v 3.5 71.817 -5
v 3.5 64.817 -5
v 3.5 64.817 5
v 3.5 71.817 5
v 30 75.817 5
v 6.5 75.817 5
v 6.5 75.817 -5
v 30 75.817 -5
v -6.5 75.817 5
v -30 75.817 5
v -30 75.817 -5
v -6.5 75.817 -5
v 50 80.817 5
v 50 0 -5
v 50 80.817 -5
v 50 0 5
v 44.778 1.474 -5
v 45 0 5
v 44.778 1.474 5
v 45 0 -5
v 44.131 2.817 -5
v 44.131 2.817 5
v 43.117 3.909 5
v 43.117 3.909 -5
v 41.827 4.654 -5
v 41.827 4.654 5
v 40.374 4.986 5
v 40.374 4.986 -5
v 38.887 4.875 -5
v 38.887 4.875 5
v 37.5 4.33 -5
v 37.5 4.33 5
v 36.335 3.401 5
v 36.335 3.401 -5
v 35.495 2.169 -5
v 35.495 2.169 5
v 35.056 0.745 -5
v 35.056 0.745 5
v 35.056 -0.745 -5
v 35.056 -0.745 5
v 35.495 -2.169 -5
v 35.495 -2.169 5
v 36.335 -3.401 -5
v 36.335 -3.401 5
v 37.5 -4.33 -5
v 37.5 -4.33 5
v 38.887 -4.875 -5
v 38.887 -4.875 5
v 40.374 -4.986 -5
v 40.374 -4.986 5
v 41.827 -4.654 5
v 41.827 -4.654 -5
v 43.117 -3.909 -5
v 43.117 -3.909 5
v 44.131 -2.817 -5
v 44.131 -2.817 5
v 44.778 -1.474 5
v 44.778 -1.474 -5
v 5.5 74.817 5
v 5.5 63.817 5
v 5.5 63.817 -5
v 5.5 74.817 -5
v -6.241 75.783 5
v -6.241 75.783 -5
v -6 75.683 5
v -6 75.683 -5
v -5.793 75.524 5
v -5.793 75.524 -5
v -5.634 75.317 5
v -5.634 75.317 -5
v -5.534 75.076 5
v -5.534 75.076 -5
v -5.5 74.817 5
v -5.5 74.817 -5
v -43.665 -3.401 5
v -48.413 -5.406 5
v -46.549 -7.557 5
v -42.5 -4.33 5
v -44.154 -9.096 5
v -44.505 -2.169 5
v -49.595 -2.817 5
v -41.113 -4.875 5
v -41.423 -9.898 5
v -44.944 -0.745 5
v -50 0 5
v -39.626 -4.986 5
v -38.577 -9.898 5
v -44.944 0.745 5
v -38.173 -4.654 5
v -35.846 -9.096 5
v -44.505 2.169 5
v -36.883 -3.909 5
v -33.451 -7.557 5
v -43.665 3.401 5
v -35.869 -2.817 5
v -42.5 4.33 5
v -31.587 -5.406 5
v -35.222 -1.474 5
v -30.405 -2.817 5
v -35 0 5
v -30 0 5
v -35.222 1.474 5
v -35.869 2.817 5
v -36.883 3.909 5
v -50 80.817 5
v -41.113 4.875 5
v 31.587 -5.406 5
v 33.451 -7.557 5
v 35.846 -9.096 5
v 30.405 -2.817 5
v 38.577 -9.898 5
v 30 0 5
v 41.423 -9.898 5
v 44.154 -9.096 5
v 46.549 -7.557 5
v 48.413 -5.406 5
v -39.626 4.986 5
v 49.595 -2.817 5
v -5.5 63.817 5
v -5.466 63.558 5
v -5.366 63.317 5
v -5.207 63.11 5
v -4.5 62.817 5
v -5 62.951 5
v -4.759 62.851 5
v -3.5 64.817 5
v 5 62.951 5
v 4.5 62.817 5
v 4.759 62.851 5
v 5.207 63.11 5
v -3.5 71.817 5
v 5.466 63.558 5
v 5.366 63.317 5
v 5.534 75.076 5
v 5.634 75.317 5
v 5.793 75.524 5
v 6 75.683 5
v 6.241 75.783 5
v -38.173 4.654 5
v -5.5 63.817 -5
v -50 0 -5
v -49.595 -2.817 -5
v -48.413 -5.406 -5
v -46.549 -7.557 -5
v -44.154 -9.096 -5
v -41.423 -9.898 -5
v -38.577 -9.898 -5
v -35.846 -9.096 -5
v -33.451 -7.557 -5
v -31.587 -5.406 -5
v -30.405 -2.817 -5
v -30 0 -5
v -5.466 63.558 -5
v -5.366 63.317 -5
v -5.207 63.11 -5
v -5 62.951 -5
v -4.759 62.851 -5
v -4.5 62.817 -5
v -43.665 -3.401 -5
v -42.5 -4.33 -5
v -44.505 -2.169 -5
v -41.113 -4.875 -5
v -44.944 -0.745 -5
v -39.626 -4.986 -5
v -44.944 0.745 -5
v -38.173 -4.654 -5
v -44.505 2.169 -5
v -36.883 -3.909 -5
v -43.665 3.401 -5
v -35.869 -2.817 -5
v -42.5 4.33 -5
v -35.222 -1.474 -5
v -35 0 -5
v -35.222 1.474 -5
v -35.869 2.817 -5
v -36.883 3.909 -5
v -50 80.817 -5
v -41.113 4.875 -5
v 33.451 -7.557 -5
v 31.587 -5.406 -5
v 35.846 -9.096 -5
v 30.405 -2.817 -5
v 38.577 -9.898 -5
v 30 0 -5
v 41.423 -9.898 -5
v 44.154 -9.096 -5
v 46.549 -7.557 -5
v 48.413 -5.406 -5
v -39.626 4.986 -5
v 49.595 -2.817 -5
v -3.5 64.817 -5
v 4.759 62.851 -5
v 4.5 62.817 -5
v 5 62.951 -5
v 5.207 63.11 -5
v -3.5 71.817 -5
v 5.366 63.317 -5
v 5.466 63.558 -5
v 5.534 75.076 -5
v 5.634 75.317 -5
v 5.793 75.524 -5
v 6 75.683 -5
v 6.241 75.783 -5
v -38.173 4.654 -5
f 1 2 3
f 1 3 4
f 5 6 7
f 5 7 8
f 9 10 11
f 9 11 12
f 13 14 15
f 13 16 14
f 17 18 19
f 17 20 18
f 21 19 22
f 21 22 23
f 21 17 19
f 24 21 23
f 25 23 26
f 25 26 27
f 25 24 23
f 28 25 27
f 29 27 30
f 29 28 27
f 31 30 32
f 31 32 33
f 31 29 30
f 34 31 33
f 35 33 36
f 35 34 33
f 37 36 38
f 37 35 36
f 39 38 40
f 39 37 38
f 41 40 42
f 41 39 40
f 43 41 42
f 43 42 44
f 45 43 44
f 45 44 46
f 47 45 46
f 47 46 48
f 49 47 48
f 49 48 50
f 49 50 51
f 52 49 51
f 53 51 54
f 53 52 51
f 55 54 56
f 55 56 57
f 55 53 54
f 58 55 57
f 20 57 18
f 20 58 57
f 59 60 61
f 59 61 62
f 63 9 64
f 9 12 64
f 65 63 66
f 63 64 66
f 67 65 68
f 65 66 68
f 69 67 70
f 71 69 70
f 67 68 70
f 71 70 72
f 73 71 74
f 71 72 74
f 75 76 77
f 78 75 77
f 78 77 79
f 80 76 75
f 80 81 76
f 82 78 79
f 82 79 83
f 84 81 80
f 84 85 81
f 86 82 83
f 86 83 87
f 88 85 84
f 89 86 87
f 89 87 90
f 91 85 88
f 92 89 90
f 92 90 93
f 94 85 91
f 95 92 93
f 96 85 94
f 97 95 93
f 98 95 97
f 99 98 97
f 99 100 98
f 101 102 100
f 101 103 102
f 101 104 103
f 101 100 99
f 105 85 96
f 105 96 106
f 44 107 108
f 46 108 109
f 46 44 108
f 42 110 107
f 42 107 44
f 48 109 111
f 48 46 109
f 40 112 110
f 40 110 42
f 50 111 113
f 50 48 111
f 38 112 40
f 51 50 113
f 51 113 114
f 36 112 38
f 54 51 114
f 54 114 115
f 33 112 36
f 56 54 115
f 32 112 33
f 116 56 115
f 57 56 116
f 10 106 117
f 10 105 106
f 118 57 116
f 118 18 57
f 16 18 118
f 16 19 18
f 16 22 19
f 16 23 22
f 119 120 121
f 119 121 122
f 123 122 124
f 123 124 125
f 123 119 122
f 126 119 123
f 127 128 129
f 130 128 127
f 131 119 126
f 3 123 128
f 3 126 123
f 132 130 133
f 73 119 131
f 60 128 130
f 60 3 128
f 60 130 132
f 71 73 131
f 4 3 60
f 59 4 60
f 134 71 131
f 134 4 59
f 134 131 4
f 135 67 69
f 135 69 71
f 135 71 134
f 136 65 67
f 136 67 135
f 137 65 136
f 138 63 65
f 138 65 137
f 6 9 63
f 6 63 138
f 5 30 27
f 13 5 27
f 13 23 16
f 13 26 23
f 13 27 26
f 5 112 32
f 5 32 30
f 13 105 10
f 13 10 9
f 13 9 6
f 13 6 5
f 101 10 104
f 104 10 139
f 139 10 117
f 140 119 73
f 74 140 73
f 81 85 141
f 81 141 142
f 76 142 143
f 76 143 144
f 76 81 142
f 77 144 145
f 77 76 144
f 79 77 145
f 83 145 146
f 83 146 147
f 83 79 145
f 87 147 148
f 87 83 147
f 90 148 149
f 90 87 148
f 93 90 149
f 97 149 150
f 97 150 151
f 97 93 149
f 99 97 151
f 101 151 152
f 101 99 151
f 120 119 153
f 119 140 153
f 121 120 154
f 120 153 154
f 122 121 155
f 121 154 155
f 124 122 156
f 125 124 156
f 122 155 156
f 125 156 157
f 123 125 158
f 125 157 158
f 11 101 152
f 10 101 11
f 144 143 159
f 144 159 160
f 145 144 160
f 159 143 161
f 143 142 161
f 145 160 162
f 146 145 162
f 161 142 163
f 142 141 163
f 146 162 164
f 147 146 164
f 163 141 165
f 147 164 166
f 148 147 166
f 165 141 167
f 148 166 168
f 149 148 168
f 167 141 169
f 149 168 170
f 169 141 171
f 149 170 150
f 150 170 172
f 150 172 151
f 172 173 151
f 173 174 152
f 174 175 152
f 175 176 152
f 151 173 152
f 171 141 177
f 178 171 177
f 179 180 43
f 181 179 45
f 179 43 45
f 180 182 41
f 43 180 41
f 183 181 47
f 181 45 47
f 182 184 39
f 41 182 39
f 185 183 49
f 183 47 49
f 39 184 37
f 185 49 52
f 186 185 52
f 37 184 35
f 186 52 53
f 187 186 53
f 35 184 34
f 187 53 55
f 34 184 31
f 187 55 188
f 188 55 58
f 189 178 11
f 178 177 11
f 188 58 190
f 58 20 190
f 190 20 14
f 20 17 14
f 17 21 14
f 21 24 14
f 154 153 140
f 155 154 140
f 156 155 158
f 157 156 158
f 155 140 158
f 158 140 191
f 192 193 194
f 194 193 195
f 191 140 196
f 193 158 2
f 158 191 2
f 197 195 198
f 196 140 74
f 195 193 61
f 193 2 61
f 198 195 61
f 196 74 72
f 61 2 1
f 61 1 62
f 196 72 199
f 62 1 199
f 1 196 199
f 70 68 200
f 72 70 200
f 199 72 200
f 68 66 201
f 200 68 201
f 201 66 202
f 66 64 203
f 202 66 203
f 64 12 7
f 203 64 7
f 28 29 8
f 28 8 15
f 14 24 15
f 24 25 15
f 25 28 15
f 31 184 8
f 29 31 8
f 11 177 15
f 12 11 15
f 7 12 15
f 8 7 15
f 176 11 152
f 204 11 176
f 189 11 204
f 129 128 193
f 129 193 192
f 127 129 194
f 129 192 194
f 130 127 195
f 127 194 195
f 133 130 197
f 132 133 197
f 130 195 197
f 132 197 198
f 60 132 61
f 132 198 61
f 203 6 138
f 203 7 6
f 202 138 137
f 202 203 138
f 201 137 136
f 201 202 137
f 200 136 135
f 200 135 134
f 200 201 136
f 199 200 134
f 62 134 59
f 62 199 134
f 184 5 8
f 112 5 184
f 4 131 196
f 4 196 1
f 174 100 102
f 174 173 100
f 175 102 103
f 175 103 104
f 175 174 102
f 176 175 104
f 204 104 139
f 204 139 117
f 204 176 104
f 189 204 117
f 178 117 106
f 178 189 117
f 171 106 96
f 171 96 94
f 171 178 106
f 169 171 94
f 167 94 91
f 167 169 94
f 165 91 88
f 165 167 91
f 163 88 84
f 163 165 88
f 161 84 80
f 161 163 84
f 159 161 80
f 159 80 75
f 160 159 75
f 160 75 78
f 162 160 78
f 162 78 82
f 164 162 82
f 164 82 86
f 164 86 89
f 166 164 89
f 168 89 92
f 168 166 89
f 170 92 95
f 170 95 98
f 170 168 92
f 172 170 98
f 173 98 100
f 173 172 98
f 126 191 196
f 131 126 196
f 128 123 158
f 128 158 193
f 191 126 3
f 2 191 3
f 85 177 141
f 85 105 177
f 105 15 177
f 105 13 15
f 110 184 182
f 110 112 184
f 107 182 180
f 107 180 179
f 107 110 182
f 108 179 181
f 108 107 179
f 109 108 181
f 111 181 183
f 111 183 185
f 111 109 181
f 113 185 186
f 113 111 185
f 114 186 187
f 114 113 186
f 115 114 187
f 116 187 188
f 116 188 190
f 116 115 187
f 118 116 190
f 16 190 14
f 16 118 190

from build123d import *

# Parameters (mm, degrees)
SKETCH1_W           = 60
SKETCH1_H           = 5
SKETCH1_R           = 10
SKETCH1_R_2         = 5
BOSS_EXTRUDE1_DEPTH = 5
SKETCH2_W           = 11
SKETCH2_H           = 13
SKETCH2_W_2         = 7
SKETCH2_H_2         = 7
BOSS_EXTRUDE2_DEPTH = 10
FILLET1_R           = 1


with BuildPart() as part:
    # Sketch1 → Boss-Extrude1 (new body, symmetric)
    with BuildSketch(Plane.XY):
        with BuildLine():
            Line((-50, 80.817230765), (-50, 0))
            ThreePointArc((-50, 0), (-40, 10), (-30, 0))
            Line((-30, 0), (-30, 75.817230765))
            Line((-30, 75.817230765), (-30, 80.817230765))
            Line((-30, 80.817230765), (-50, 80.817230765))
        make_face()
        with Locations((0, 78.317230765)):
            Rectangle(SKETCH1_W, SKETCH1_H)
        with BuildLine():
            Line((50, 80.817230765), (30, 80.817230765))
            Line((30, 80.817230765), (30, 75.817230765))
            Line((30, 75.817230765), (30, 0))
            ThreePointArc((30, 0), (40, 10), (50, 0))
            Line((50, 0), (50, 80.817230765))
        make_face()
        with Locations((-40, 0)):
            Circle(SKETCH1_R)
        with Locations((-40, 0)):
            Circle(SKETCH1_R_2, mode=Mode.SUBTRACT)
        with Locations((40, 0)):
            Circle(SKETCH1_R)
        with Locations((40, 0)):
            Circle(SKETCH1_R_2, mode=Mode.SUBTRACT)
    extrude(amount=BOSS_EXTRUDE1_DEPTH, both=True)

    # Sketch2 → Boss-Extrude2 (add)
    with BuildSketch(Plane.XY.offset(5)):
        with Locations((0, 69.317230765)):
            Rectangle(SKETCH2_W, SKETCH2_H)
        with Locations((0, 68.317230765)):
            Rectangle(SKETCH2_W_2, SKETCH2_H_2, mode=Mode.SUBTRACT)
    extrude(amount=-BOSS_EXTRUDE2_DEPTH)

    # Fillet1
    fillet1_edges = [part.edges().sort_by_distance(p)[0] for p in [
        (5.5, 62.817230765, 0),
        (-5.5, 62.817230765, 0),
        (-5.5, 75.817230765, 0),
        (5.5, 75.817230765, 0),
    ]]
    fillet(fillet1_edges, radius=FILLET1_R)


solid = part.part
